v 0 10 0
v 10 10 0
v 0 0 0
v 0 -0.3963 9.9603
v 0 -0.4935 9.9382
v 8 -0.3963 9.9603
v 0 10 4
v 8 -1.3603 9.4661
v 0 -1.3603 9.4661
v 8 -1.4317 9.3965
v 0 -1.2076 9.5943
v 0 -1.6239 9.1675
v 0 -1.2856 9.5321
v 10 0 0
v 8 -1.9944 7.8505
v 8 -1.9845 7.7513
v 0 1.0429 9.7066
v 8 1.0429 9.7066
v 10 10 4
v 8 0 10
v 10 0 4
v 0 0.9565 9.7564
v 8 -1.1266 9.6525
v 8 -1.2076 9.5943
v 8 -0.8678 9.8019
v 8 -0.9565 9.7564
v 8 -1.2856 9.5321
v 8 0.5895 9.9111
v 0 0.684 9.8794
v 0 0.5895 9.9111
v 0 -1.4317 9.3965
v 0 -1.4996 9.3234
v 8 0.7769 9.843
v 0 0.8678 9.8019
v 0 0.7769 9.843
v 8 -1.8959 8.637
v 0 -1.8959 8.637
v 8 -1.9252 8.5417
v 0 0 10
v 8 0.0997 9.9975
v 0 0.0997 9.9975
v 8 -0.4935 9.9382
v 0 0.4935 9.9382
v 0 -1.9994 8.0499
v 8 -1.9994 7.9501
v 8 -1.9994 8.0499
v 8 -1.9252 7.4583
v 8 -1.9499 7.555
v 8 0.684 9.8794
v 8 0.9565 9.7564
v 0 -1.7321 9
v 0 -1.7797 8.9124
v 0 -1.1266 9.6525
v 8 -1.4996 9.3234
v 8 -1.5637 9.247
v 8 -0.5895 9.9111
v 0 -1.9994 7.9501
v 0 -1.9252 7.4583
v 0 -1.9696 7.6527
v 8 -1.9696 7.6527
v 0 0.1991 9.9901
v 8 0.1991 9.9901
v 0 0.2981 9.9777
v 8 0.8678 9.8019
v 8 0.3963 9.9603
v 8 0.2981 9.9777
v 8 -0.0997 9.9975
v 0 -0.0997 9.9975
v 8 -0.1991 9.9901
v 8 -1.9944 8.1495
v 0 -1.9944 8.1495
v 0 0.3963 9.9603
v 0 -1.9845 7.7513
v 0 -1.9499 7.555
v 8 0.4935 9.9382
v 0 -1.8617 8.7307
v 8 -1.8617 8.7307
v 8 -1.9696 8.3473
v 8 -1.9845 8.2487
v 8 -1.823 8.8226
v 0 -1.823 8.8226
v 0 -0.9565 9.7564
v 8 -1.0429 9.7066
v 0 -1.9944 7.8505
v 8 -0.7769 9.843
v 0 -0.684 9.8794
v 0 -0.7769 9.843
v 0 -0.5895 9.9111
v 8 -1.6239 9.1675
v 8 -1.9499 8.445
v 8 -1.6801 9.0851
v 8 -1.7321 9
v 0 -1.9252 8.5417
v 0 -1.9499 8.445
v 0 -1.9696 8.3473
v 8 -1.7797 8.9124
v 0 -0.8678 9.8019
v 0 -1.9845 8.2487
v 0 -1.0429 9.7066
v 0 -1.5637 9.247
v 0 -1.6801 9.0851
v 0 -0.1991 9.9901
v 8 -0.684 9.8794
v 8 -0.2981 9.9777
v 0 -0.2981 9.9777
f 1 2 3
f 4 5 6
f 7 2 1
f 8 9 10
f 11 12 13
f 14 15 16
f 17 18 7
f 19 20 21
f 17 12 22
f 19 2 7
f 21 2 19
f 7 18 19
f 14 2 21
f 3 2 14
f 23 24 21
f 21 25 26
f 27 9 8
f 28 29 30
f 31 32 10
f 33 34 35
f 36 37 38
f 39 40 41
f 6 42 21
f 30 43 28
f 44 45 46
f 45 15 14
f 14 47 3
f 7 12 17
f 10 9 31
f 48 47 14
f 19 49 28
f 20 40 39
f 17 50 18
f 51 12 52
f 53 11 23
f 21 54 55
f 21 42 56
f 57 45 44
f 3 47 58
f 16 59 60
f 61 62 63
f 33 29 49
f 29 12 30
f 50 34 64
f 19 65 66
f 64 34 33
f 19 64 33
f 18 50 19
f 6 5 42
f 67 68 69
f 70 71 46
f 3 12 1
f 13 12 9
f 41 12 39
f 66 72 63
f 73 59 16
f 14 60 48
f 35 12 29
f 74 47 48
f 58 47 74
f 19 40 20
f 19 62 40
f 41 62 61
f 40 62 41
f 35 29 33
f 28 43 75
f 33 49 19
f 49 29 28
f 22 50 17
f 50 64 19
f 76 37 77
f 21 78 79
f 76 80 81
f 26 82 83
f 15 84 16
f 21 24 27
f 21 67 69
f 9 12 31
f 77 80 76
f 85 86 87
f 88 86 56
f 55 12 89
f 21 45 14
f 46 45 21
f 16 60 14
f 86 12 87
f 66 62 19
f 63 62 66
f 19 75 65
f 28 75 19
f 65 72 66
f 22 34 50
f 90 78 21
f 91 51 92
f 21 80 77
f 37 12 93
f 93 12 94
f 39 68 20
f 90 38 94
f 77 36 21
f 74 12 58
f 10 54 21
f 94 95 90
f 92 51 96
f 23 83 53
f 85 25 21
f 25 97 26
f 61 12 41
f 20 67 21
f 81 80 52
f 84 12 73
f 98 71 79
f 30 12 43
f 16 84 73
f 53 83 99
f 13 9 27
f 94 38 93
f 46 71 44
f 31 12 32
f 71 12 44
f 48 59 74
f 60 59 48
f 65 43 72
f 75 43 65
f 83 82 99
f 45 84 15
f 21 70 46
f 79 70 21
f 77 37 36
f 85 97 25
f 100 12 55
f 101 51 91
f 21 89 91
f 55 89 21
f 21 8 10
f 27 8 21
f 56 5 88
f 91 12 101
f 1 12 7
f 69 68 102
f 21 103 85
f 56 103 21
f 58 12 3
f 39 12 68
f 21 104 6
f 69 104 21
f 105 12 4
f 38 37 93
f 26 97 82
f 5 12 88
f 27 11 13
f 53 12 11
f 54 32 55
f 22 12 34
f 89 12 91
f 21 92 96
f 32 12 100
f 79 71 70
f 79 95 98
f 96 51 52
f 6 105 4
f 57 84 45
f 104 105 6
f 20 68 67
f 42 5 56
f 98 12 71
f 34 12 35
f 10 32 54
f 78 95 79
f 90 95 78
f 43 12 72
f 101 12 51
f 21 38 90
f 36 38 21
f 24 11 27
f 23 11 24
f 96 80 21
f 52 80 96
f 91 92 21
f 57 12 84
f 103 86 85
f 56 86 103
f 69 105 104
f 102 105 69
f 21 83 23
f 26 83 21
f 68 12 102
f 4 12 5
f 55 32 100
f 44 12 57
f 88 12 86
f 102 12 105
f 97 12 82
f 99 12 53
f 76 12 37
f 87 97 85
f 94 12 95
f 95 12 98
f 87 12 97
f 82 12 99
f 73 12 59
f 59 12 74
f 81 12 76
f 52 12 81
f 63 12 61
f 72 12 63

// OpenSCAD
// illustrate use of hull() for connecting parts

$fa=0.5; // default minimum facet angle is now 0.5
$fs=0.1; // default minimum facet size is now 0.1 mm

module first(){
     color("orange") cube([10, 10, 4]);
     color("blue") translate([0, 0, 8]) rotate([0, 90, 0])
	  cylinder(d=4, h=8);
}

module second(){
     color("orange"){

	  hull(){
	       cube([10, 10, 4]);
	       translate([0, 0, 8]) rotate([0, 90, 0])
		    cylinder(d=4, h=8);
	  }

     }
}

module third(){
     color("blue")
	  translate([0, 0, 8]) rotate([0, 90, 0]) cylinder(d=3, h=12);
     color("orange"){
	  hull(){
	       cube([10, 10, 4]);
	       translate([2, 0, 8]) rotate([0, 90, 0])
		    cylinder(d=4, h=4);
	  }
     }
}

// first();
second();
// third();
